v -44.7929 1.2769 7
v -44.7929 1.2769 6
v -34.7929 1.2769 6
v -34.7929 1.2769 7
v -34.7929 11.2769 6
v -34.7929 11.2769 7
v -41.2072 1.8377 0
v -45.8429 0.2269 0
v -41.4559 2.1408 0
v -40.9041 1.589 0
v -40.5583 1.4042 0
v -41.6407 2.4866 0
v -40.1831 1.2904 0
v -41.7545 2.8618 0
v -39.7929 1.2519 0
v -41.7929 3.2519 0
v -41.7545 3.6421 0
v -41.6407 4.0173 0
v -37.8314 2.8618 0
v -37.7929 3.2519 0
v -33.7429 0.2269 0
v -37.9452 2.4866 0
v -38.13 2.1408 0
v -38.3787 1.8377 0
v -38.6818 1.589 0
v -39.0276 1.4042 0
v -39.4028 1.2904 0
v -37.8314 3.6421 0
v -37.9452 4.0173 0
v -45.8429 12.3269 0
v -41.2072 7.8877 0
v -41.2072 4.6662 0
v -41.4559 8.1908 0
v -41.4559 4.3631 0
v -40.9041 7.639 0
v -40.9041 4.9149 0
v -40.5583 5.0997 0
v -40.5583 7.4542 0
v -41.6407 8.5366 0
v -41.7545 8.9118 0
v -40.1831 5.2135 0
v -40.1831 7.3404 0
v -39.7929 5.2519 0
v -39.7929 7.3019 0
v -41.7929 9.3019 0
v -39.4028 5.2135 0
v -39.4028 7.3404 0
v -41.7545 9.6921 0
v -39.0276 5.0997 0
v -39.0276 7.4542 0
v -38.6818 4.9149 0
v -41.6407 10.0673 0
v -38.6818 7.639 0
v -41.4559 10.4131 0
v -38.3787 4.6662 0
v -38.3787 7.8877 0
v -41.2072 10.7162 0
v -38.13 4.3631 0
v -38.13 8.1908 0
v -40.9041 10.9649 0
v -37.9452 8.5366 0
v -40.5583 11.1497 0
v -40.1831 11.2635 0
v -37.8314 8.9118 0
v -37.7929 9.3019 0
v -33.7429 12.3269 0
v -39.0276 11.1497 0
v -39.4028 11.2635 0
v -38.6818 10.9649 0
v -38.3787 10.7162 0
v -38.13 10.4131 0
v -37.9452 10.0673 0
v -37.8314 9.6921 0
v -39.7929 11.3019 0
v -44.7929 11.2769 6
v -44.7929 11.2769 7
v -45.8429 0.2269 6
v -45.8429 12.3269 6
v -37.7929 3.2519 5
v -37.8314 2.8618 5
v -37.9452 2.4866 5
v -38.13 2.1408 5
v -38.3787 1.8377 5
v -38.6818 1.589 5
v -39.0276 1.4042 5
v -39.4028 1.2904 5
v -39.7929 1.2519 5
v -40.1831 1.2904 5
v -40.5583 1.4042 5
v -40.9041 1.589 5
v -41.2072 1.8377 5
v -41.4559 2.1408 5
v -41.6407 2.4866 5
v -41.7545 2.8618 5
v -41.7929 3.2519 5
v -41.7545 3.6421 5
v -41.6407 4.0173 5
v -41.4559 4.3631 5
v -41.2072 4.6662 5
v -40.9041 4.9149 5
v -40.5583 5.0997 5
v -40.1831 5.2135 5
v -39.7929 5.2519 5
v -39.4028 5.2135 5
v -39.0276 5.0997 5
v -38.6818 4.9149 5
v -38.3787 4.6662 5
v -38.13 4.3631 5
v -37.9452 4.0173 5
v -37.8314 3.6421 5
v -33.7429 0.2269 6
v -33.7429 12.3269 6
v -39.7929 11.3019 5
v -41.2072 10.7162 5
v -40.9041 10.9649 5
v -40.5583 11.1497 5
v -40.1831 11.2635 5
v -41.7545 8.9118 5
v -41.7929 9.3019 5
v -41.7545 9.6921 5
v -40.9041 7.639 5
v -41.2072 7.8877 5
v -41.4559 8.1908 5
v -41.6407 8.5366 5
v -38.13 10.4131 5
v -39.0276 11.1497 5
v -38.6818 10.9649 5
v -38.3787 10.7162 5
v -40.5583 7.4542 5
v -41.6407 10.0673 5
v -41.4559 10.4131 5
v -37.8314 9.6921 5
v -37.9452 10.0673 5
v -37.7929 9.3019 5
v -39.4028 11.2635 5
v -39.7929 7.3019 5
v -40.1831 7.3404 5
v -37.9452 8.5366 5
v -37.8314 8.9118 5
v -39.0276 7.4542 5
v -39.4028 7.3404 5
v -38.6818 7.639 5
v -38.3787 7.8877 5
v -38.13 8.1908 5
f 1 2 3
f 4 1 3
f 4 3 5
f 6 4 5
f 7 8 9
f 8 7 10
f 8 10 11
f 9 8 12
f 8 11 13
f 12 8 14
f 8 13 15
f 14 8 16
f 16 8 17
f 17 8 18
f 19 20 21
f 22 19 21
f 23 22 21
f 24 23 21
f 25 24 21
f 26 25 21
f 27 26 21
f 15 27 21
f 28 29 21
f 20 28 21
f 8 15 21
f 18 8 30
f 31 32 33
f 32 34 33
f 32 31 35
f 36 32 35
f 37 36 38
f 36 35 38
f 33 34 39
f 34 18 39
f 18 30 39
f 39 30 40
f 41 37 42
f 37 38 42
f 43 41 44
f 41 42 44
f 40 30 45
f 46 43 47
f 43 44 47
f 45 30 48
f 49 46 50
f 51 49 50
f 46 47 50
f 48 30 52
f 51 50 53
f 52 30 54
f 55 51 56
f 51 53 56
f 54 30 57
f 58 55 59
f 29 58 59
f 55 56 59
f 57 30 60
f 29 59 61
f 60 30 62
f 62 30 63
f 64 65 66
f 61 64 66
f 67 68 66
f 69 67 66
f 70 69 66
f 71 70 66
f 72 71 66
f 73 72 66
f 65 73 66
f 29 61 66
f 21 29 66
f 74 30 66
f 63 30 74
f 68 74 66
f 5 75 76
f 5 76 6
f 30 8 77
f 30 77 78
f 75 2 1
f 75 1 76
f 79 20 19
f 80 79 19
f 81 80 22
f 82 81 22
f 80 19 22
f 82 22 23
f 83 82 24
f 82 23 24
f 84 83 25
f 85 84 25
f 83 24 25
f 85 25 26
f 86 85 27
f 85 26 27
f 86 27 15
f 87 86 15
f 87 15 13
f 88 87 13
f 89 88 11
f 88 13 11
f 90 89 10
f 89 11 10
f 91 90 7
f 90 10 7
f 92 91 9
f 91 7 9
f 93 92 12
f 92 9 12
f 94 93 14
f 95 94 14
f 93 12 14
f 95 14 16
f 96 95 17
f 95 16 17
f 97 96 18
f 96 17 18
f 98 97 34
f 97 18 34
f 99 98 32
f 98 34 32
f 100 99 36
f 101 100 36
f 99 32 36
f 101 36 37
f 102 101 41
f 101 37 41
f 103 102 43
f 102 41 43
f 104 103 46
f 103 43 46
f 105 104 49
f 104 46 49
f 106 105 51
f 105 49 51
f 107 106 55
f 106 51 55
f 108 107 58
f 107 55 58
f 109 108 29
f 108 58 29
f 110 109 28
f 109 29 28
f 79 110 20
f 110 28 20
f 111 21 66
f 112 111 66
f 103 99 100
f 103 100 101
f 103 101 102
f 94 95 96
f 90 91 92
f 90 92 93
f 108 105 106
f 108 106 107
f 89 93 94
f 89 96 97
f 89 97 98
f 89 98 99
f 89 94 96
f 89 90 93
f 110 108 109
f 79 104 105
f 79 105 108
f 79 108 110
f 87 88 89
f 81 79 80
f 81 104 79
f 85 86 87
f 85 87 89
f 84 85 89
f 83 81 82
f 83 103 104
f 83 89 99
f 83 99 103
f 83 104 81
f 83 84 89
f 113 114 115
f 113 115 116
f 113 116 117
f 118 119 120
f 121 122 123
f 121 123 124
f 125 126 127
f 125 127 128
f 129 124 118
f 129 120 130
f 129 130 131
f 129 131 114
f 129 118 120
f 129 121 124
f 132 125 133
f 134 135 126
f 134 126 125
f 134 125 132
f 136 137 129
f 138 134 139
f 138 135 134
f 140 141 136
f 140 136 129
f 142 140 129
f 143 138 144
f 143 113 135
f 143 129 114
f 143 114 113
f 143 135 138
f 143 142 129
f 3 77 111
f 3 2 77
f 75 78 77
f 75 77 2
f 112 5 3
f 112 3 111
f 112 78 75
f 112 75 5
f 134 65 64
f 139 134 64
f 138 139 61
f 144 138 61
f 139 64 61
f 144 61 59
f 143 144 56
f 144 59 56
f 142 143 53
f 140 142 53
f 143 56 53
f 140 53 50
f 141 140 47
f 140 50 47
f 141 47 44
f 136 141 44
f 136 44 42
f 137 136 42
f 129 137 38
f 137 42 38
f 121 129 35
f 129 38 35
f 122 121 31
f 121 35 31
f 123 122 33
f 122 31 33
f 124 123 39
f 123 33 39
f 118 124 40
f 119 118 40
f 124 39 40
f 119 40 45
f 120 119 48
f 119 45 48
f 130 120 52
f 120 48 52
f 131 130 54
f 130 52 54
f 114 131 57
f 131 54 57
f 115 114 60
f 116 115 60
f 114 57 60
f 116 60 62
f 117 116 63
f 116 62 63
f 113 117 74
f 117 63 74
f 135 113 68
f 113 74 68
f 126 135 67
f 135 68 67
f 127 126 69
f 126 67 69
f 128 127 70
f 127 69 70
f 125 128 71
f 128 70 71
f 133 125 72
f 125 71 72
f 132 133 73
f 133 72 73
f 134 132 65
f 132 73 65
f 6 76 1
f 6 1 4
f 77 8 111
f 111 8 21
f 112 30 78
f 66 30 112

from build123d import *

# Parameters (mm, degrees)
F0_W     = 12.1
F0_H     = 12.1
F1_DEPTH = 6
F2_R     = 2
F3_DEPTH = 5
F4_W     = 10
F4_H     = 10
F5_DEPTH = 1


with BuildPart() as f1:
    # F0 (on Top) → F1 (new body)
    with BuildSketch(Plane.XY):
        with Locations((-39.792942, 6.276945)):
            Rectangle(F0_W, F0_H)
    extrude(amount=F1_DEPTH)

    # F2 (on face) → F3 (cut)
    with BuildSketch(Plane(origin=(0, 0, 0), x_dir=(1, 0, 0), z_dir=(0, 0, -1))):
        with Locations((-39.792942, -3.251945)):
            Circle(F2_R)
        with Locations((-39.792942, -9.301945)):
            Circle(F2_R)
    extrude(amount=-F3_DEPTH, mode=Mode.SUBTRACT)

    # F4 (on face) → F5 (join)
    with BuildSketch(Plane.XY.offset(6)):
        with Locations((-39.792942, 6.276945)):
            Rectangle(F4_W, F4_H)
    extrude(amount=F5_DEPTH)


solid = f1.part
